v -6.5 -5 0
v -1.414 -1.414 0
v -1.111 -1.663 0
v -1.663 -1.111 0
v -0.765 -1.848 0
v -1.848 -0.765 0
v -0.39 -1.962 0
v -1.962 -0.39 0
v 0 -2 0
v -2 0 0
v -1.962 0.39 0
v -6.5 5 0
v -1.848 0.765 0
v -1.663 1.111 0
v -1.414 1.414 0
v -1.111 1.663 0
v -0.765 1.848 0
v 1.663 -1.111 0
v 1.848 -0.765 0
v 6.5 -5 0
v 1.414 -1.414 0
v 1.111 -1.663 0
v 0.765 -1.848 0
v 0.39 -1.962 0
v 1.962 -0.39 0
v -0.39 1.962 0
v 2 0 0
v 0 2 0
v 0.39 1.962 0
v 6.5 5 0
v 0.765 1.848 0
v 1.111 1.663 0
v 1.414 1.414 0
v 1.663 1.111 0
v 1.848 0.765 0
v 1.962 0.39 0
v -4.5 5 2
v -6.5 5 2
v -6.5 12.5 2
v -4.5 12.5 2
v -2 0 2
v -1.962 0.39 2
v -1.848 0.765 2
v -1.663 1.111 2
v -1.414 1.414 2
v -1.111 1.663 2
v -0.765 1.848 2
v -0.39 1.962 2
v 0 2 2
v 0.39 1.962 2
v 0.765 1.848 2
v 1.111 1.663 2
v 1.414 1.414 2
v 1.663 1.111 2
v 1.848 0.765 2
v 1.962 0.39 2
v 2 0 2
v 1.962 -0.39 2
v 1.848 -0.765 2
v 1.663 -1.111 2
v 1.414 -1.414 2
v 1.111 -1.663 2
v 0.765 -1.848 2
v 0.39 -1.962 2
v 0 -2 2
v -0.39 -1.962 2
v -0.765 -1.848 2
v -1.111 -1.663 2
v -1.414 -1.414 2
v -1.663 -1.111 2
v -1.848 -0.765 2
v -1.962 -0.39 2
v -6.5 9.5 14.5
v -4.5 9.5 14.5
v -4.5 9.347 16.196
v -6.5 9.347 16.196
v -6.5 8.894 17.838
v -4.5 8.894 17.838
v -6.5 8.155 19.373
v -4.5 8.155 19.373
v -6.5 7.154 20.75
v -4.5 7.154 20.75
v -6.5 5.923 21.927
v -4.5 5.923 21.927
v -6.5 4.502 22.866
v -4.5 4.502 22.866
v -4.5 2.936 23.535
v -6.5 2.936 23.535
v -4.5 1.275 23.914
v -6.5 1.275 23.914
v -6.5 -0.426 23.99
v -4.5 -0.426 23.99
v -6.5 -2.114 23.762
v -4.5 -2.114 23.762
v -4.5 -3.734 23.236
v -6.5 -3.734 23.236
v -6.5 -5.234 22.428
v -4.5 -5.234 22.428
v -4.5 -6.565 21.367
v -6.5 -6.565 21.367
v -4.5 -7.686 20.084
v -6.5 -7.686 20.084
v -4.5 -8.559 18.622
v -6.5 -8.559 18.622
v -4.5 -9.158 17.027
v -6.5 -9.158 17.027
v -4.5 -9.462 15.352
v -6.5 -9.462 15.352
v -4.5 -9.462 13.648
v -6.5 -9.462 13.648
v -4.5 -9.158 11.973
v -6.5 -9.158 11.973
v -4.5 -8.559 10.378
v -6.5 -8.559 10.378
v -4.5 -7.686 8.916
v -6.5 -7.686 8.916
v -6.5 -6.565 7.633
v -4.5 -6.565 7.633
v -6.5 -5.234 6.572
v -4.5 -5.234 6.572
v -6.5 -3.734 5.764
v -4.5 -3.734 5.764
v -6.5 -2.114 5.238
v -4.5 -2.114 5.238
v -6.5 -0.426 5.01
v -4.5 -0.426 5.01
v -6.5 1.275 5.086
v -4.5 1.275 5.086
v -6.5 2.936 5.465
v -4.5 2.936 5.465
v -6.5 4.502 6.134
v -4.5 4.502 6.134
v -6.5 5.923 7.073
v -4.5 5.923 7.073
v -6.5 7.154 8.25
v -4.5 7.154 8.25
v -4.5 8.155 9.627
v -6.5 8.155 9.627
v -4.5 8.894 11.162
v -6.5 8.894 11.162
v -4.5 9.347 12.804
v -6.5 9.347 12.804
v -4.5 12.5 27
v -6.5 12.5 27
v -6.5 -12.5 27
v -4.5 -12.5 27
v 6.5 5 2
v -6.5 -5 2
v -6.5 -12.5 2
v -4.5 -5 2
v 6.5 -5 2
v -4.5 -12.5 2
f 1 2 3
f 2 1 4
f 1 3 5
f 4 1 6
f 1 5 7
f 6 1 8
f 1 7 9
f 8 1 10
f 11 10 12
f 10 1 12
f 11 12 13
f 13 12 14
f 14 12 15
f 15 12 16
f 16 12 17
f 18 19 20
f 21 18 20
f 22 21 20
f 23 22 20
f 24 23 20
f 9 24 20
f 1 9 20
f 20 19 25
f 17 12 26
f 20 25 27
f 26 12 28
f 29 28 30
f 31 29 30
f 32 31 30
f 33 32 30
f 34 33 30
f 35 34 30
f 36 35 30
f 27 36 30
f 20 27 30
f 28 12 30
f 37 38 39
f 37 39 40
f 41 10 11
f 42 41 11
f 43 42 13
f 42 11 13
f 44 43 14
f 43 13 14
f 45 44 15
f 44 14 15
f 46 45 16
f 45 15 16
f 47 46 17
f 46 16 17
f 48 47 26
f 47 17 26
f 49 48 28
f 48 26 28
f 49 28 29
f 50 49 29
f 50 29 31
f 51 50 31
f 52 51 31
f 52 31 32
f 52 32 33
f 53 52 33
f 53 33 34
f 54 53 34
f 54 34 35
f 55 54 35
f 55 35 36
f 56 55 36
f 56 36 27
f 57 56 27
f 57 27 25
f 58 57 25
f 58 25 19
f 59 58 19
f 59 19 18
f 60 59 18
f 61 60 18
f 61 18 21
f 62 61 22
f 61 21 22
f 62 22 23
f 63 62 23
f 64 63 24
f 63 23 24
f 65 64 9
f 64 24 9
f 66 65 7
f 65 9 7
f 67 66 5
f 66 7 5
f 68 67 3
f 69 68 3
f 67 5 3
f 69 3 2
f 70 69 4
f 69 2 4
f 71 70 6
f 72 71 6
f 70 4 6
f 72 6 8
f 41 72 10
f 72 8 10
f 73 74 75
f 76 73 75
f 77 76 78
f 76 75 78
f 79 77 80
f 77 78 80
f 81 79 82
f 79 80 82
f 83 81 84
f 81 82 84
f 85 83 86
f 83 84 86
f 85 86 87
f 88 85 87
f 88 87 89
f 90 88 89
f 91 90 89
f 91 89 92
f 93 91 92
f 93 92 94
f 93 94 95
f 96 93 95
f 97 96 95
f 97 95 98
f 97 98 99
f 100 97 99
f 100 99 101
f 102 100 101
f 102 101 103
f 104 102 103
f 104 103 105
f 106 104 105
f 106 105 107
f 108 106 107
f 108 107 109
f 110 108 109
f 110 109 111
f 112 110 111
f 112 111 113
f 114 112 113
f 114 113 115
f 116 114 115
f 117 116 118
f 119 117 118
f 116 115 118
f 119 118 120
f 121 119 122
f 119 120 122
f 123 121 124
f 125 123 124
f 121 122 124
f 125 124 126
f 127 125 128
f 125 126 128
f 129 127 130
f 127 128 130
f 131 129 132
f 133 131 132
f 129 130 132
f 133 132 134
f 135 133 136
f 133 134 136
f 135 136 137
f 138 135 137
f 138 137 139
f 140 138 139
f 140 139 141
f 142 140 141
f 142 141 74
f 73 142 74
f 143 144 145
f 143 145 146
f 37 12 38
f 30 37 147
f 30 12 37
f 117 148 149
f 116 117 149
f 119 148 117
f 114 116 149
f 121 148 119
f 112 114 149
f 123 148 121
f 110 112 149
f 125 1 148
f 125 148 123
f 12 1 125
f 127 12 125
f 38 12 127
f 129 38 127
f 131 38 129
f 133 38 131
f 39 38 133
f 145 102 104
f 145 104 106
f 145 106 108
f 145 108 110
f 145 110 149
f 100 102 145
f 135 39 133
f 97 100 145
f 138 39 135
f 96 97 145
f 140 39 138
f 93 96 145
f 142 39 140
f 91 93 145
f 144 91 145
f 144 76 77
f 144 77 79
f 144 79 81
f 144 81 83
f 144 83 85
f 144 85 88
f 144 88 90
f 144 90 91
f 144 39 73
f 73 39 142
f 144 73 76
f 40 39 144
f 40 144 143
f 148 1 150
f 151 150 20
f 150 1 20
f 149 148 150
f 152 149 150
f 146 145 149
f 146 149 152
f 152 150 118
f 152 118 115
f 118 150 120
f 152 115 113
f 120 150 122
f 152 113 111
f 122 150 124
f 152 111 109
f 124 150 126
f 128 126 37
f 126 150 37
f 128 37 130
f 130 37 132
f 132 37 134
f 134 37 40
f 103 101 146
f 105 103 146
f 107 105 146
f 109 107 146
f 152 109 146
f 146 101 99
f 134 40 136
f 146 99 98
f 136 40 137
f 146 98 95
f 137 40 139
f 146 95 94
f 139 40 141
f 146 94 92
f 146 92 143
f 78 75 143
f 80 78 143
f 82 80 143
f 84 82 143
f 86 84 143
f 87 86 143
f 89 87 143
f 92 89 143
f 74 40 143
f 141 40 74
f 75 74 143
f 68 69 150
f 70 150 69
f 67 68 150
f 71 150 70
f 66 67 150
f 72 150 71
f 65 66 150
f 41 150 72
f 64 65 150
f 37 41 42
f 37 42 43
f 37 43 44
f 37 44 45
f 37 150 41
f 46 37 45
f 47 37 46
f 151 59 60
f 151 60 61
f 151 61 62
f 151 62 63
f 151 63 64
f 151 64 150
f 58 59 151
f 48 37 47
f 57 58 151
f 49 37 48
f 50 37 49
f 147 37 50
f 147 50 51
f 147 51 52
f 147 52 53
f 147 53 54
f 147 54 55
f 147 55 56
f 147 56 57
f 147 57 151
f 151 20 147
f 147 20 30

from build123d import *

# Parameters (mm, degrees)
SKETCH1_W           = 13
SKETCH1_H           = 10
BOSS_EXTRUDE1_DEPTH = 2
SKETCH2_W           = 2
SKETCH2_H           = 10
BOSS_EXTRUDE2_DEPTH = 25
SKETCH4_W           = 2
SKETCH4_H           = 25
BOSS_EXTRUDE3_DEPTH = 7.5
SKETCH5_W           = 2
SKETCH5_H           = 25
BOSS_EXTRUDE4_DEPTH = 7.5
SKETCH6_R           = 2
CUT_EXTRUDE1_DEPTH  = 7.5
SKETCH7_R           = 9.5
CUT_EXTRUDE2_DEPTH  = 32.721443851


with BuildPart() as part:
    # Sketch1 → Boss-Extrude1 (new body)
    with BuildSketch(Plane.XY):
        Rectangle(SKETCH1_W, SKETCH1_H)
    extrude(amount=BOSS_EXTRUDE1_DEPTH)

    # Sketch2 → Boss-Extrude2 (add)
    with BuildSketch(Plane.XY.offset(2)):
        with Locations((-5.5, 0)):
            Rectangle(SKETCH2_W, SKETCH2_H)
    extrude(amount=BOSS_EXTRUDE2_DEPTH)

    # Sketch4 → Boss-Extrude3 (add)
    with BuildSketch(Plane(origin=(0, 5, 0), x_dir=(1, 0, 0), z_dir=(0, 1, 0))):
        with Locations((-5.5, -14.5)):
            Rectangle(SKETCH4_W, SKETCH4_H)
    extrude(amount=BOSS_EXTRUDE3_DEPTH)

    # Sketch5 → Boss-Extrude4 (add)
    with BuildSketch(Plane.XZ.offset(5)):
        with Locations((-5.5, 14.5)):
            Rectangle(SKETCH5_W, SKETCH5_H)
    extrude(amount=BOSS_EXTRUDE4_DEPTH)

    # Sketch6 → Cut-Extrude1 (cut)
    with BuildSketch(Plane(origin=(0, 0, 0), x_dir=(-1, 0, 0), z_dir=(0, 0, -1))):
        Circle(SKETCH6_R)
    extrude(amount=-CUT_EXTRUDE1_DEPTH, mode=Mode.SUBTRACT)

    # Sketch7 → Cut-Extrude2 (cut, through all)
    with BuildSketch(Plane(origin=(-4.5, 0, 0), x_dir=(0, 0, -1), z_dir=(1, 0, 0))):
        with Locations(Location((-14.5, 0, 0), (0, 0, 90))):
            Circle(SKETCH7_R)
    extrude(amount=-CUT_EXTRUDE2_DEPTH, mode=Mode.SUBTRACT)


solid = part.part
